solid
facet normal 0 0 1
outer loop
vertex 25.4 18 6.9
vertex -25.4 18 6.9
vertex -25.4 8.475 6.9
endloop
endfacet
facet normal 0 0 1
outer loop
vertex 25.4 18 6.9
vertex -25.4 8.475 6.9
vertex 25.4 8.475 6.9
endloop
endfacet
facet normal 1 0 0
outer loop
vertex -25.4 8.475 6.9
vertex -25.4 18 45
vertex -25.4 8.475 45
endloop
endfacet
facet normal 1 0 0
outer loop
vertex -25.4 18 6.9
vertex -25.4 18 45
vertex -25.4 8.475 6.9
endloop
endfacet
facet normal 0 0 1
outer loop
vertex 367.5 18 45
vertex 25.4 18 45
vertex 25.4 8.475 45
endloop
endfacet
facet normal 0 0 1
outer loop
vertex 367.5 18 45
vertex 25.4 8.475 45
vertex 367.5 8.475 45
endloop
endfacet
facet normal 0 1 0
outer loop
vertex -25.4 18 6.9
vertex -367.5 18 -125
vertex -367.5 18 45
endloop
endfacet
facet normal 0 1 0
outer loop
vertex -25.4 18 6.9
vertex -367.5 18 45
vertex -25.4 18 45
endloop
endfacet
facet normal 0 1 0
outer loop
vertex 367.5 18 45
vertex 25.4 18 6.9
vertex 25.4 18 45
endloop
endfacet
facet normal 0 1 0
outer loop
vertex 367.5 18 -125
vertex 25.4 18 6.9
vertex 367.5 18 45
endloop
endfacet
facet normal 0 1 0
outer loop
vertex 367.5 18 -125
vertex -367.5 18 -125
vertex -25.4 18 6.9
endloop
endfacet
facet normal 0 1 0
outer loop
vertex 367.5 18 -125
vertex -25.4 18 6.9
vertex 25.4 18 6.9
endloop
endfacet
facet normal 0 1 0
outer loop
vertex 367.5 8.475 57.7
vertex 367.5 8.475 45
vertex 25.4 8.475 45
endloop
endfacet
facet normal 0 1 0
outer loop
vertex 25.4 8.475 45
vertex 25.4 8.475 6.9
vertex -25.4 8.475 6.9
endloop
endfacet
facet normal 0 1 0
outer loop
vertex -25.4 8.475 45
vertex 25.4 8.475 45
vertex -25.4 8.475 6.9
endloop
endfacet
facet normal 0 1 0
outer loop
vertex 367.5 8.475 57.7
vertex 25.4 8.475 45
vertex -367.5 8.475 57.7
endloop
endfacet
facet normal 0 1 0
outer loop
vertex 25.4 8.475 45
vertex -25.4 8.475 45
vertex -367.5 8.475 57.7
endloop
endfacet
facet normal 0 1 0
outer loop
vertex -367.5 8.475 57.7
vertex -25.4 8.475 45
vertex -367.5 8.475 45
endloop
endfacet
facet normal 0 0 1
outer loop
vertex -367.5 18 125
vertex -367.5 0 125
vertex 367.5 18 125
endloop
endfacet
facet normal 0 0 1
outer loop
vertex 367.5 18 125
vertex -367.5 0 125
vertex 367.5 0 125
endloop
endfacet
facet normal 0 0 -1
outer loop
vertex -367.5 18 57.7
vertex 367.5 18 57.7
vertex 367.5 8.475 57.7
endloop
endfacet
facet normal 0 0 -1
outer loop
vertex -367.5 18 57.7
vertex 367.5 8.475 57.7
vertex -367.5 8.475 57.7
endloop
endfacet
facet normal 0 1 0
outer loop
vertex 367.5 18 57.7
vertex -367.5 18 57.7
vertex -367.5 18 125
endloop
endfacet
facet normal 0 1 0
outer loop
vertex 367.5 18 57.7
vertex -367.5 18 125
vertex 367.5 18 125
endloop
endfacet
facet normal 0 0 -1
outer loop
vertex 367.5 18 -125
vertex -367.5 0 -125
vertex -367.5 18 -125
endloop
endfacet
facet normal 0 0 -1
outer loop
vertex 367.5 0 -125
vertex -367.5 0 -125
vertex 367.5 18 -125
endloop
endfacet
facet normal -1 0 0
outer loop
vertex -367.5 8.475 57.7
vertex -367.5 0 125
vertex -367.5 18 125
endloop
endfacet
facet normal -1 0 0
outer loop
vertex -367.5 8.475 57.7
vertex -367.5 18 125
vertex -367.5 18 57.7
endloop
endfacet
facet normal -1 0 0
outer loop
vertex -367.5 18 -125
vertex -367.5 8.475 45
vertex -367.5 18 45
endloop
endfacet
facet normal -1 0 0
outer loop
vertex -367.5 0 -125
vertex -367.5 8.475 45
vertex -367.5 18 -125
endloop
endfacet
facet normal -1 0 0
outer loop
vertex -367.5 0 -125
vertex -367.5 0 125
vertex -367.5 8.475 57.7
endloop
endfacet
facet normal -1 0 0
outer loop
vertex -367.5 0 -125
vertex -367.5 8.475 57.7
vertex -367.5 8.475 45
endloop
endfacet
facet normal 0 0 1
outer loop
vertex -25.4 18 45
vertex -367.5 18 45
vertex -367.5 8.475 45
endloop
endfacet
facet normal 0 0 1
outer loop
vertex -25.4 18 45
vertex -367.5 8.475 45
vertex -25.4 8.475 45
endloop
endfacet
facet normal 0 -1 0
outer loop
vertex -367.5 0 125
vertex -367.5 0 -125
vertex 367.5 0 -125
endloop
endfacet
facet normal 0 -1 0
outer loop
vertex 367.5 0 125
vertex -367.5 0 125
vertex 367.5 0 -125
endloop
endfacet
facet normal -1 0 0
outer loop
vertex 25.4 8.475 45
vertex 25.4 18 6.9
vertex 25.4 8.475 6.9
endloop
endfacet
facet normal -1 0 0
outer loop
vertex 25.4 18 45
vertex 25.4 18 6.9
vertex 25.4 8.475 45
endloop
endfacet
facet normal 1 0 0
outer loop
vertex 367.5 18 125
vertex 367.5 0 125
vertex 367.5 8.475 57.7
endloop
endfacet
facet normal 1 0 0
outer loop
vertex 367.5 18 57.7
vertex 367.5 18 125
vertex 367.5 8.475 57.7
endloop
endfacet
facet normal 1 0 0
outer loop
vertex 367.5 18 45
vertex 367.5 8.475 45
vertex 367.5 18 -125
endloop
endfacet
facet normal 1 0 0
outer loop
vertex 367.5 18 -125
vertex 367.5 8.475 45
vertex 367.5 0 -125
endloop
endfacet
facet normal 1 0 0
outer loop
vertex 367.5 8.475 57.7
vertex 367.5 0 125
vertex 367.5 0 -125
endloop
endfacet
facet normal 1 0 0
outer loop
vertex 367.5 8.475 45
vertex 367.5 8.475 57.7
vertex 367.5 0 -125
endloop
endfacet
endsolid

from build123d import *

# Parameters (mm, degrees)
SKETCH1_W           = 735
SKETCH1_H           = 250
BOSS_EXTRUDE1_DEPTH = 18
CUT_EXTRUDE1_DEPTH  = 9.525


with BuildPart() as part:
    # Sketch1 → Boss-Extrude1 (new body)
    with BuildSketch(Plane(origin=(0, 0, 0), x_dir=(1, 0, 0), z_dir=(0, 1, 0))):
        Rectangle(SKETCH1_W, SKETCH1_H)
    extrude(amount=BOSS_EXTRUDE1_DEPTH)

    # Sketch4 → Cut-Extrude1 (cut)
    with BuildSketch(Plane(origin=(0, 18, 0), x_dir=(1, 0, 0), z_dir=(0, 1, 0))):
        Polygon((-390.644484973, -45), (-25.4, -45), (-25.4, -6.9), (25.4, -6.9), (25.4, -45), (418.930169805, -45), (418.930169805, -57.7), (-390.644484973, -57.7), align=None)
    extrude(amount=-CUT_EXTRUDE1_DEPTH, mode=Mode.SUBTRACT)


solid = part.part
